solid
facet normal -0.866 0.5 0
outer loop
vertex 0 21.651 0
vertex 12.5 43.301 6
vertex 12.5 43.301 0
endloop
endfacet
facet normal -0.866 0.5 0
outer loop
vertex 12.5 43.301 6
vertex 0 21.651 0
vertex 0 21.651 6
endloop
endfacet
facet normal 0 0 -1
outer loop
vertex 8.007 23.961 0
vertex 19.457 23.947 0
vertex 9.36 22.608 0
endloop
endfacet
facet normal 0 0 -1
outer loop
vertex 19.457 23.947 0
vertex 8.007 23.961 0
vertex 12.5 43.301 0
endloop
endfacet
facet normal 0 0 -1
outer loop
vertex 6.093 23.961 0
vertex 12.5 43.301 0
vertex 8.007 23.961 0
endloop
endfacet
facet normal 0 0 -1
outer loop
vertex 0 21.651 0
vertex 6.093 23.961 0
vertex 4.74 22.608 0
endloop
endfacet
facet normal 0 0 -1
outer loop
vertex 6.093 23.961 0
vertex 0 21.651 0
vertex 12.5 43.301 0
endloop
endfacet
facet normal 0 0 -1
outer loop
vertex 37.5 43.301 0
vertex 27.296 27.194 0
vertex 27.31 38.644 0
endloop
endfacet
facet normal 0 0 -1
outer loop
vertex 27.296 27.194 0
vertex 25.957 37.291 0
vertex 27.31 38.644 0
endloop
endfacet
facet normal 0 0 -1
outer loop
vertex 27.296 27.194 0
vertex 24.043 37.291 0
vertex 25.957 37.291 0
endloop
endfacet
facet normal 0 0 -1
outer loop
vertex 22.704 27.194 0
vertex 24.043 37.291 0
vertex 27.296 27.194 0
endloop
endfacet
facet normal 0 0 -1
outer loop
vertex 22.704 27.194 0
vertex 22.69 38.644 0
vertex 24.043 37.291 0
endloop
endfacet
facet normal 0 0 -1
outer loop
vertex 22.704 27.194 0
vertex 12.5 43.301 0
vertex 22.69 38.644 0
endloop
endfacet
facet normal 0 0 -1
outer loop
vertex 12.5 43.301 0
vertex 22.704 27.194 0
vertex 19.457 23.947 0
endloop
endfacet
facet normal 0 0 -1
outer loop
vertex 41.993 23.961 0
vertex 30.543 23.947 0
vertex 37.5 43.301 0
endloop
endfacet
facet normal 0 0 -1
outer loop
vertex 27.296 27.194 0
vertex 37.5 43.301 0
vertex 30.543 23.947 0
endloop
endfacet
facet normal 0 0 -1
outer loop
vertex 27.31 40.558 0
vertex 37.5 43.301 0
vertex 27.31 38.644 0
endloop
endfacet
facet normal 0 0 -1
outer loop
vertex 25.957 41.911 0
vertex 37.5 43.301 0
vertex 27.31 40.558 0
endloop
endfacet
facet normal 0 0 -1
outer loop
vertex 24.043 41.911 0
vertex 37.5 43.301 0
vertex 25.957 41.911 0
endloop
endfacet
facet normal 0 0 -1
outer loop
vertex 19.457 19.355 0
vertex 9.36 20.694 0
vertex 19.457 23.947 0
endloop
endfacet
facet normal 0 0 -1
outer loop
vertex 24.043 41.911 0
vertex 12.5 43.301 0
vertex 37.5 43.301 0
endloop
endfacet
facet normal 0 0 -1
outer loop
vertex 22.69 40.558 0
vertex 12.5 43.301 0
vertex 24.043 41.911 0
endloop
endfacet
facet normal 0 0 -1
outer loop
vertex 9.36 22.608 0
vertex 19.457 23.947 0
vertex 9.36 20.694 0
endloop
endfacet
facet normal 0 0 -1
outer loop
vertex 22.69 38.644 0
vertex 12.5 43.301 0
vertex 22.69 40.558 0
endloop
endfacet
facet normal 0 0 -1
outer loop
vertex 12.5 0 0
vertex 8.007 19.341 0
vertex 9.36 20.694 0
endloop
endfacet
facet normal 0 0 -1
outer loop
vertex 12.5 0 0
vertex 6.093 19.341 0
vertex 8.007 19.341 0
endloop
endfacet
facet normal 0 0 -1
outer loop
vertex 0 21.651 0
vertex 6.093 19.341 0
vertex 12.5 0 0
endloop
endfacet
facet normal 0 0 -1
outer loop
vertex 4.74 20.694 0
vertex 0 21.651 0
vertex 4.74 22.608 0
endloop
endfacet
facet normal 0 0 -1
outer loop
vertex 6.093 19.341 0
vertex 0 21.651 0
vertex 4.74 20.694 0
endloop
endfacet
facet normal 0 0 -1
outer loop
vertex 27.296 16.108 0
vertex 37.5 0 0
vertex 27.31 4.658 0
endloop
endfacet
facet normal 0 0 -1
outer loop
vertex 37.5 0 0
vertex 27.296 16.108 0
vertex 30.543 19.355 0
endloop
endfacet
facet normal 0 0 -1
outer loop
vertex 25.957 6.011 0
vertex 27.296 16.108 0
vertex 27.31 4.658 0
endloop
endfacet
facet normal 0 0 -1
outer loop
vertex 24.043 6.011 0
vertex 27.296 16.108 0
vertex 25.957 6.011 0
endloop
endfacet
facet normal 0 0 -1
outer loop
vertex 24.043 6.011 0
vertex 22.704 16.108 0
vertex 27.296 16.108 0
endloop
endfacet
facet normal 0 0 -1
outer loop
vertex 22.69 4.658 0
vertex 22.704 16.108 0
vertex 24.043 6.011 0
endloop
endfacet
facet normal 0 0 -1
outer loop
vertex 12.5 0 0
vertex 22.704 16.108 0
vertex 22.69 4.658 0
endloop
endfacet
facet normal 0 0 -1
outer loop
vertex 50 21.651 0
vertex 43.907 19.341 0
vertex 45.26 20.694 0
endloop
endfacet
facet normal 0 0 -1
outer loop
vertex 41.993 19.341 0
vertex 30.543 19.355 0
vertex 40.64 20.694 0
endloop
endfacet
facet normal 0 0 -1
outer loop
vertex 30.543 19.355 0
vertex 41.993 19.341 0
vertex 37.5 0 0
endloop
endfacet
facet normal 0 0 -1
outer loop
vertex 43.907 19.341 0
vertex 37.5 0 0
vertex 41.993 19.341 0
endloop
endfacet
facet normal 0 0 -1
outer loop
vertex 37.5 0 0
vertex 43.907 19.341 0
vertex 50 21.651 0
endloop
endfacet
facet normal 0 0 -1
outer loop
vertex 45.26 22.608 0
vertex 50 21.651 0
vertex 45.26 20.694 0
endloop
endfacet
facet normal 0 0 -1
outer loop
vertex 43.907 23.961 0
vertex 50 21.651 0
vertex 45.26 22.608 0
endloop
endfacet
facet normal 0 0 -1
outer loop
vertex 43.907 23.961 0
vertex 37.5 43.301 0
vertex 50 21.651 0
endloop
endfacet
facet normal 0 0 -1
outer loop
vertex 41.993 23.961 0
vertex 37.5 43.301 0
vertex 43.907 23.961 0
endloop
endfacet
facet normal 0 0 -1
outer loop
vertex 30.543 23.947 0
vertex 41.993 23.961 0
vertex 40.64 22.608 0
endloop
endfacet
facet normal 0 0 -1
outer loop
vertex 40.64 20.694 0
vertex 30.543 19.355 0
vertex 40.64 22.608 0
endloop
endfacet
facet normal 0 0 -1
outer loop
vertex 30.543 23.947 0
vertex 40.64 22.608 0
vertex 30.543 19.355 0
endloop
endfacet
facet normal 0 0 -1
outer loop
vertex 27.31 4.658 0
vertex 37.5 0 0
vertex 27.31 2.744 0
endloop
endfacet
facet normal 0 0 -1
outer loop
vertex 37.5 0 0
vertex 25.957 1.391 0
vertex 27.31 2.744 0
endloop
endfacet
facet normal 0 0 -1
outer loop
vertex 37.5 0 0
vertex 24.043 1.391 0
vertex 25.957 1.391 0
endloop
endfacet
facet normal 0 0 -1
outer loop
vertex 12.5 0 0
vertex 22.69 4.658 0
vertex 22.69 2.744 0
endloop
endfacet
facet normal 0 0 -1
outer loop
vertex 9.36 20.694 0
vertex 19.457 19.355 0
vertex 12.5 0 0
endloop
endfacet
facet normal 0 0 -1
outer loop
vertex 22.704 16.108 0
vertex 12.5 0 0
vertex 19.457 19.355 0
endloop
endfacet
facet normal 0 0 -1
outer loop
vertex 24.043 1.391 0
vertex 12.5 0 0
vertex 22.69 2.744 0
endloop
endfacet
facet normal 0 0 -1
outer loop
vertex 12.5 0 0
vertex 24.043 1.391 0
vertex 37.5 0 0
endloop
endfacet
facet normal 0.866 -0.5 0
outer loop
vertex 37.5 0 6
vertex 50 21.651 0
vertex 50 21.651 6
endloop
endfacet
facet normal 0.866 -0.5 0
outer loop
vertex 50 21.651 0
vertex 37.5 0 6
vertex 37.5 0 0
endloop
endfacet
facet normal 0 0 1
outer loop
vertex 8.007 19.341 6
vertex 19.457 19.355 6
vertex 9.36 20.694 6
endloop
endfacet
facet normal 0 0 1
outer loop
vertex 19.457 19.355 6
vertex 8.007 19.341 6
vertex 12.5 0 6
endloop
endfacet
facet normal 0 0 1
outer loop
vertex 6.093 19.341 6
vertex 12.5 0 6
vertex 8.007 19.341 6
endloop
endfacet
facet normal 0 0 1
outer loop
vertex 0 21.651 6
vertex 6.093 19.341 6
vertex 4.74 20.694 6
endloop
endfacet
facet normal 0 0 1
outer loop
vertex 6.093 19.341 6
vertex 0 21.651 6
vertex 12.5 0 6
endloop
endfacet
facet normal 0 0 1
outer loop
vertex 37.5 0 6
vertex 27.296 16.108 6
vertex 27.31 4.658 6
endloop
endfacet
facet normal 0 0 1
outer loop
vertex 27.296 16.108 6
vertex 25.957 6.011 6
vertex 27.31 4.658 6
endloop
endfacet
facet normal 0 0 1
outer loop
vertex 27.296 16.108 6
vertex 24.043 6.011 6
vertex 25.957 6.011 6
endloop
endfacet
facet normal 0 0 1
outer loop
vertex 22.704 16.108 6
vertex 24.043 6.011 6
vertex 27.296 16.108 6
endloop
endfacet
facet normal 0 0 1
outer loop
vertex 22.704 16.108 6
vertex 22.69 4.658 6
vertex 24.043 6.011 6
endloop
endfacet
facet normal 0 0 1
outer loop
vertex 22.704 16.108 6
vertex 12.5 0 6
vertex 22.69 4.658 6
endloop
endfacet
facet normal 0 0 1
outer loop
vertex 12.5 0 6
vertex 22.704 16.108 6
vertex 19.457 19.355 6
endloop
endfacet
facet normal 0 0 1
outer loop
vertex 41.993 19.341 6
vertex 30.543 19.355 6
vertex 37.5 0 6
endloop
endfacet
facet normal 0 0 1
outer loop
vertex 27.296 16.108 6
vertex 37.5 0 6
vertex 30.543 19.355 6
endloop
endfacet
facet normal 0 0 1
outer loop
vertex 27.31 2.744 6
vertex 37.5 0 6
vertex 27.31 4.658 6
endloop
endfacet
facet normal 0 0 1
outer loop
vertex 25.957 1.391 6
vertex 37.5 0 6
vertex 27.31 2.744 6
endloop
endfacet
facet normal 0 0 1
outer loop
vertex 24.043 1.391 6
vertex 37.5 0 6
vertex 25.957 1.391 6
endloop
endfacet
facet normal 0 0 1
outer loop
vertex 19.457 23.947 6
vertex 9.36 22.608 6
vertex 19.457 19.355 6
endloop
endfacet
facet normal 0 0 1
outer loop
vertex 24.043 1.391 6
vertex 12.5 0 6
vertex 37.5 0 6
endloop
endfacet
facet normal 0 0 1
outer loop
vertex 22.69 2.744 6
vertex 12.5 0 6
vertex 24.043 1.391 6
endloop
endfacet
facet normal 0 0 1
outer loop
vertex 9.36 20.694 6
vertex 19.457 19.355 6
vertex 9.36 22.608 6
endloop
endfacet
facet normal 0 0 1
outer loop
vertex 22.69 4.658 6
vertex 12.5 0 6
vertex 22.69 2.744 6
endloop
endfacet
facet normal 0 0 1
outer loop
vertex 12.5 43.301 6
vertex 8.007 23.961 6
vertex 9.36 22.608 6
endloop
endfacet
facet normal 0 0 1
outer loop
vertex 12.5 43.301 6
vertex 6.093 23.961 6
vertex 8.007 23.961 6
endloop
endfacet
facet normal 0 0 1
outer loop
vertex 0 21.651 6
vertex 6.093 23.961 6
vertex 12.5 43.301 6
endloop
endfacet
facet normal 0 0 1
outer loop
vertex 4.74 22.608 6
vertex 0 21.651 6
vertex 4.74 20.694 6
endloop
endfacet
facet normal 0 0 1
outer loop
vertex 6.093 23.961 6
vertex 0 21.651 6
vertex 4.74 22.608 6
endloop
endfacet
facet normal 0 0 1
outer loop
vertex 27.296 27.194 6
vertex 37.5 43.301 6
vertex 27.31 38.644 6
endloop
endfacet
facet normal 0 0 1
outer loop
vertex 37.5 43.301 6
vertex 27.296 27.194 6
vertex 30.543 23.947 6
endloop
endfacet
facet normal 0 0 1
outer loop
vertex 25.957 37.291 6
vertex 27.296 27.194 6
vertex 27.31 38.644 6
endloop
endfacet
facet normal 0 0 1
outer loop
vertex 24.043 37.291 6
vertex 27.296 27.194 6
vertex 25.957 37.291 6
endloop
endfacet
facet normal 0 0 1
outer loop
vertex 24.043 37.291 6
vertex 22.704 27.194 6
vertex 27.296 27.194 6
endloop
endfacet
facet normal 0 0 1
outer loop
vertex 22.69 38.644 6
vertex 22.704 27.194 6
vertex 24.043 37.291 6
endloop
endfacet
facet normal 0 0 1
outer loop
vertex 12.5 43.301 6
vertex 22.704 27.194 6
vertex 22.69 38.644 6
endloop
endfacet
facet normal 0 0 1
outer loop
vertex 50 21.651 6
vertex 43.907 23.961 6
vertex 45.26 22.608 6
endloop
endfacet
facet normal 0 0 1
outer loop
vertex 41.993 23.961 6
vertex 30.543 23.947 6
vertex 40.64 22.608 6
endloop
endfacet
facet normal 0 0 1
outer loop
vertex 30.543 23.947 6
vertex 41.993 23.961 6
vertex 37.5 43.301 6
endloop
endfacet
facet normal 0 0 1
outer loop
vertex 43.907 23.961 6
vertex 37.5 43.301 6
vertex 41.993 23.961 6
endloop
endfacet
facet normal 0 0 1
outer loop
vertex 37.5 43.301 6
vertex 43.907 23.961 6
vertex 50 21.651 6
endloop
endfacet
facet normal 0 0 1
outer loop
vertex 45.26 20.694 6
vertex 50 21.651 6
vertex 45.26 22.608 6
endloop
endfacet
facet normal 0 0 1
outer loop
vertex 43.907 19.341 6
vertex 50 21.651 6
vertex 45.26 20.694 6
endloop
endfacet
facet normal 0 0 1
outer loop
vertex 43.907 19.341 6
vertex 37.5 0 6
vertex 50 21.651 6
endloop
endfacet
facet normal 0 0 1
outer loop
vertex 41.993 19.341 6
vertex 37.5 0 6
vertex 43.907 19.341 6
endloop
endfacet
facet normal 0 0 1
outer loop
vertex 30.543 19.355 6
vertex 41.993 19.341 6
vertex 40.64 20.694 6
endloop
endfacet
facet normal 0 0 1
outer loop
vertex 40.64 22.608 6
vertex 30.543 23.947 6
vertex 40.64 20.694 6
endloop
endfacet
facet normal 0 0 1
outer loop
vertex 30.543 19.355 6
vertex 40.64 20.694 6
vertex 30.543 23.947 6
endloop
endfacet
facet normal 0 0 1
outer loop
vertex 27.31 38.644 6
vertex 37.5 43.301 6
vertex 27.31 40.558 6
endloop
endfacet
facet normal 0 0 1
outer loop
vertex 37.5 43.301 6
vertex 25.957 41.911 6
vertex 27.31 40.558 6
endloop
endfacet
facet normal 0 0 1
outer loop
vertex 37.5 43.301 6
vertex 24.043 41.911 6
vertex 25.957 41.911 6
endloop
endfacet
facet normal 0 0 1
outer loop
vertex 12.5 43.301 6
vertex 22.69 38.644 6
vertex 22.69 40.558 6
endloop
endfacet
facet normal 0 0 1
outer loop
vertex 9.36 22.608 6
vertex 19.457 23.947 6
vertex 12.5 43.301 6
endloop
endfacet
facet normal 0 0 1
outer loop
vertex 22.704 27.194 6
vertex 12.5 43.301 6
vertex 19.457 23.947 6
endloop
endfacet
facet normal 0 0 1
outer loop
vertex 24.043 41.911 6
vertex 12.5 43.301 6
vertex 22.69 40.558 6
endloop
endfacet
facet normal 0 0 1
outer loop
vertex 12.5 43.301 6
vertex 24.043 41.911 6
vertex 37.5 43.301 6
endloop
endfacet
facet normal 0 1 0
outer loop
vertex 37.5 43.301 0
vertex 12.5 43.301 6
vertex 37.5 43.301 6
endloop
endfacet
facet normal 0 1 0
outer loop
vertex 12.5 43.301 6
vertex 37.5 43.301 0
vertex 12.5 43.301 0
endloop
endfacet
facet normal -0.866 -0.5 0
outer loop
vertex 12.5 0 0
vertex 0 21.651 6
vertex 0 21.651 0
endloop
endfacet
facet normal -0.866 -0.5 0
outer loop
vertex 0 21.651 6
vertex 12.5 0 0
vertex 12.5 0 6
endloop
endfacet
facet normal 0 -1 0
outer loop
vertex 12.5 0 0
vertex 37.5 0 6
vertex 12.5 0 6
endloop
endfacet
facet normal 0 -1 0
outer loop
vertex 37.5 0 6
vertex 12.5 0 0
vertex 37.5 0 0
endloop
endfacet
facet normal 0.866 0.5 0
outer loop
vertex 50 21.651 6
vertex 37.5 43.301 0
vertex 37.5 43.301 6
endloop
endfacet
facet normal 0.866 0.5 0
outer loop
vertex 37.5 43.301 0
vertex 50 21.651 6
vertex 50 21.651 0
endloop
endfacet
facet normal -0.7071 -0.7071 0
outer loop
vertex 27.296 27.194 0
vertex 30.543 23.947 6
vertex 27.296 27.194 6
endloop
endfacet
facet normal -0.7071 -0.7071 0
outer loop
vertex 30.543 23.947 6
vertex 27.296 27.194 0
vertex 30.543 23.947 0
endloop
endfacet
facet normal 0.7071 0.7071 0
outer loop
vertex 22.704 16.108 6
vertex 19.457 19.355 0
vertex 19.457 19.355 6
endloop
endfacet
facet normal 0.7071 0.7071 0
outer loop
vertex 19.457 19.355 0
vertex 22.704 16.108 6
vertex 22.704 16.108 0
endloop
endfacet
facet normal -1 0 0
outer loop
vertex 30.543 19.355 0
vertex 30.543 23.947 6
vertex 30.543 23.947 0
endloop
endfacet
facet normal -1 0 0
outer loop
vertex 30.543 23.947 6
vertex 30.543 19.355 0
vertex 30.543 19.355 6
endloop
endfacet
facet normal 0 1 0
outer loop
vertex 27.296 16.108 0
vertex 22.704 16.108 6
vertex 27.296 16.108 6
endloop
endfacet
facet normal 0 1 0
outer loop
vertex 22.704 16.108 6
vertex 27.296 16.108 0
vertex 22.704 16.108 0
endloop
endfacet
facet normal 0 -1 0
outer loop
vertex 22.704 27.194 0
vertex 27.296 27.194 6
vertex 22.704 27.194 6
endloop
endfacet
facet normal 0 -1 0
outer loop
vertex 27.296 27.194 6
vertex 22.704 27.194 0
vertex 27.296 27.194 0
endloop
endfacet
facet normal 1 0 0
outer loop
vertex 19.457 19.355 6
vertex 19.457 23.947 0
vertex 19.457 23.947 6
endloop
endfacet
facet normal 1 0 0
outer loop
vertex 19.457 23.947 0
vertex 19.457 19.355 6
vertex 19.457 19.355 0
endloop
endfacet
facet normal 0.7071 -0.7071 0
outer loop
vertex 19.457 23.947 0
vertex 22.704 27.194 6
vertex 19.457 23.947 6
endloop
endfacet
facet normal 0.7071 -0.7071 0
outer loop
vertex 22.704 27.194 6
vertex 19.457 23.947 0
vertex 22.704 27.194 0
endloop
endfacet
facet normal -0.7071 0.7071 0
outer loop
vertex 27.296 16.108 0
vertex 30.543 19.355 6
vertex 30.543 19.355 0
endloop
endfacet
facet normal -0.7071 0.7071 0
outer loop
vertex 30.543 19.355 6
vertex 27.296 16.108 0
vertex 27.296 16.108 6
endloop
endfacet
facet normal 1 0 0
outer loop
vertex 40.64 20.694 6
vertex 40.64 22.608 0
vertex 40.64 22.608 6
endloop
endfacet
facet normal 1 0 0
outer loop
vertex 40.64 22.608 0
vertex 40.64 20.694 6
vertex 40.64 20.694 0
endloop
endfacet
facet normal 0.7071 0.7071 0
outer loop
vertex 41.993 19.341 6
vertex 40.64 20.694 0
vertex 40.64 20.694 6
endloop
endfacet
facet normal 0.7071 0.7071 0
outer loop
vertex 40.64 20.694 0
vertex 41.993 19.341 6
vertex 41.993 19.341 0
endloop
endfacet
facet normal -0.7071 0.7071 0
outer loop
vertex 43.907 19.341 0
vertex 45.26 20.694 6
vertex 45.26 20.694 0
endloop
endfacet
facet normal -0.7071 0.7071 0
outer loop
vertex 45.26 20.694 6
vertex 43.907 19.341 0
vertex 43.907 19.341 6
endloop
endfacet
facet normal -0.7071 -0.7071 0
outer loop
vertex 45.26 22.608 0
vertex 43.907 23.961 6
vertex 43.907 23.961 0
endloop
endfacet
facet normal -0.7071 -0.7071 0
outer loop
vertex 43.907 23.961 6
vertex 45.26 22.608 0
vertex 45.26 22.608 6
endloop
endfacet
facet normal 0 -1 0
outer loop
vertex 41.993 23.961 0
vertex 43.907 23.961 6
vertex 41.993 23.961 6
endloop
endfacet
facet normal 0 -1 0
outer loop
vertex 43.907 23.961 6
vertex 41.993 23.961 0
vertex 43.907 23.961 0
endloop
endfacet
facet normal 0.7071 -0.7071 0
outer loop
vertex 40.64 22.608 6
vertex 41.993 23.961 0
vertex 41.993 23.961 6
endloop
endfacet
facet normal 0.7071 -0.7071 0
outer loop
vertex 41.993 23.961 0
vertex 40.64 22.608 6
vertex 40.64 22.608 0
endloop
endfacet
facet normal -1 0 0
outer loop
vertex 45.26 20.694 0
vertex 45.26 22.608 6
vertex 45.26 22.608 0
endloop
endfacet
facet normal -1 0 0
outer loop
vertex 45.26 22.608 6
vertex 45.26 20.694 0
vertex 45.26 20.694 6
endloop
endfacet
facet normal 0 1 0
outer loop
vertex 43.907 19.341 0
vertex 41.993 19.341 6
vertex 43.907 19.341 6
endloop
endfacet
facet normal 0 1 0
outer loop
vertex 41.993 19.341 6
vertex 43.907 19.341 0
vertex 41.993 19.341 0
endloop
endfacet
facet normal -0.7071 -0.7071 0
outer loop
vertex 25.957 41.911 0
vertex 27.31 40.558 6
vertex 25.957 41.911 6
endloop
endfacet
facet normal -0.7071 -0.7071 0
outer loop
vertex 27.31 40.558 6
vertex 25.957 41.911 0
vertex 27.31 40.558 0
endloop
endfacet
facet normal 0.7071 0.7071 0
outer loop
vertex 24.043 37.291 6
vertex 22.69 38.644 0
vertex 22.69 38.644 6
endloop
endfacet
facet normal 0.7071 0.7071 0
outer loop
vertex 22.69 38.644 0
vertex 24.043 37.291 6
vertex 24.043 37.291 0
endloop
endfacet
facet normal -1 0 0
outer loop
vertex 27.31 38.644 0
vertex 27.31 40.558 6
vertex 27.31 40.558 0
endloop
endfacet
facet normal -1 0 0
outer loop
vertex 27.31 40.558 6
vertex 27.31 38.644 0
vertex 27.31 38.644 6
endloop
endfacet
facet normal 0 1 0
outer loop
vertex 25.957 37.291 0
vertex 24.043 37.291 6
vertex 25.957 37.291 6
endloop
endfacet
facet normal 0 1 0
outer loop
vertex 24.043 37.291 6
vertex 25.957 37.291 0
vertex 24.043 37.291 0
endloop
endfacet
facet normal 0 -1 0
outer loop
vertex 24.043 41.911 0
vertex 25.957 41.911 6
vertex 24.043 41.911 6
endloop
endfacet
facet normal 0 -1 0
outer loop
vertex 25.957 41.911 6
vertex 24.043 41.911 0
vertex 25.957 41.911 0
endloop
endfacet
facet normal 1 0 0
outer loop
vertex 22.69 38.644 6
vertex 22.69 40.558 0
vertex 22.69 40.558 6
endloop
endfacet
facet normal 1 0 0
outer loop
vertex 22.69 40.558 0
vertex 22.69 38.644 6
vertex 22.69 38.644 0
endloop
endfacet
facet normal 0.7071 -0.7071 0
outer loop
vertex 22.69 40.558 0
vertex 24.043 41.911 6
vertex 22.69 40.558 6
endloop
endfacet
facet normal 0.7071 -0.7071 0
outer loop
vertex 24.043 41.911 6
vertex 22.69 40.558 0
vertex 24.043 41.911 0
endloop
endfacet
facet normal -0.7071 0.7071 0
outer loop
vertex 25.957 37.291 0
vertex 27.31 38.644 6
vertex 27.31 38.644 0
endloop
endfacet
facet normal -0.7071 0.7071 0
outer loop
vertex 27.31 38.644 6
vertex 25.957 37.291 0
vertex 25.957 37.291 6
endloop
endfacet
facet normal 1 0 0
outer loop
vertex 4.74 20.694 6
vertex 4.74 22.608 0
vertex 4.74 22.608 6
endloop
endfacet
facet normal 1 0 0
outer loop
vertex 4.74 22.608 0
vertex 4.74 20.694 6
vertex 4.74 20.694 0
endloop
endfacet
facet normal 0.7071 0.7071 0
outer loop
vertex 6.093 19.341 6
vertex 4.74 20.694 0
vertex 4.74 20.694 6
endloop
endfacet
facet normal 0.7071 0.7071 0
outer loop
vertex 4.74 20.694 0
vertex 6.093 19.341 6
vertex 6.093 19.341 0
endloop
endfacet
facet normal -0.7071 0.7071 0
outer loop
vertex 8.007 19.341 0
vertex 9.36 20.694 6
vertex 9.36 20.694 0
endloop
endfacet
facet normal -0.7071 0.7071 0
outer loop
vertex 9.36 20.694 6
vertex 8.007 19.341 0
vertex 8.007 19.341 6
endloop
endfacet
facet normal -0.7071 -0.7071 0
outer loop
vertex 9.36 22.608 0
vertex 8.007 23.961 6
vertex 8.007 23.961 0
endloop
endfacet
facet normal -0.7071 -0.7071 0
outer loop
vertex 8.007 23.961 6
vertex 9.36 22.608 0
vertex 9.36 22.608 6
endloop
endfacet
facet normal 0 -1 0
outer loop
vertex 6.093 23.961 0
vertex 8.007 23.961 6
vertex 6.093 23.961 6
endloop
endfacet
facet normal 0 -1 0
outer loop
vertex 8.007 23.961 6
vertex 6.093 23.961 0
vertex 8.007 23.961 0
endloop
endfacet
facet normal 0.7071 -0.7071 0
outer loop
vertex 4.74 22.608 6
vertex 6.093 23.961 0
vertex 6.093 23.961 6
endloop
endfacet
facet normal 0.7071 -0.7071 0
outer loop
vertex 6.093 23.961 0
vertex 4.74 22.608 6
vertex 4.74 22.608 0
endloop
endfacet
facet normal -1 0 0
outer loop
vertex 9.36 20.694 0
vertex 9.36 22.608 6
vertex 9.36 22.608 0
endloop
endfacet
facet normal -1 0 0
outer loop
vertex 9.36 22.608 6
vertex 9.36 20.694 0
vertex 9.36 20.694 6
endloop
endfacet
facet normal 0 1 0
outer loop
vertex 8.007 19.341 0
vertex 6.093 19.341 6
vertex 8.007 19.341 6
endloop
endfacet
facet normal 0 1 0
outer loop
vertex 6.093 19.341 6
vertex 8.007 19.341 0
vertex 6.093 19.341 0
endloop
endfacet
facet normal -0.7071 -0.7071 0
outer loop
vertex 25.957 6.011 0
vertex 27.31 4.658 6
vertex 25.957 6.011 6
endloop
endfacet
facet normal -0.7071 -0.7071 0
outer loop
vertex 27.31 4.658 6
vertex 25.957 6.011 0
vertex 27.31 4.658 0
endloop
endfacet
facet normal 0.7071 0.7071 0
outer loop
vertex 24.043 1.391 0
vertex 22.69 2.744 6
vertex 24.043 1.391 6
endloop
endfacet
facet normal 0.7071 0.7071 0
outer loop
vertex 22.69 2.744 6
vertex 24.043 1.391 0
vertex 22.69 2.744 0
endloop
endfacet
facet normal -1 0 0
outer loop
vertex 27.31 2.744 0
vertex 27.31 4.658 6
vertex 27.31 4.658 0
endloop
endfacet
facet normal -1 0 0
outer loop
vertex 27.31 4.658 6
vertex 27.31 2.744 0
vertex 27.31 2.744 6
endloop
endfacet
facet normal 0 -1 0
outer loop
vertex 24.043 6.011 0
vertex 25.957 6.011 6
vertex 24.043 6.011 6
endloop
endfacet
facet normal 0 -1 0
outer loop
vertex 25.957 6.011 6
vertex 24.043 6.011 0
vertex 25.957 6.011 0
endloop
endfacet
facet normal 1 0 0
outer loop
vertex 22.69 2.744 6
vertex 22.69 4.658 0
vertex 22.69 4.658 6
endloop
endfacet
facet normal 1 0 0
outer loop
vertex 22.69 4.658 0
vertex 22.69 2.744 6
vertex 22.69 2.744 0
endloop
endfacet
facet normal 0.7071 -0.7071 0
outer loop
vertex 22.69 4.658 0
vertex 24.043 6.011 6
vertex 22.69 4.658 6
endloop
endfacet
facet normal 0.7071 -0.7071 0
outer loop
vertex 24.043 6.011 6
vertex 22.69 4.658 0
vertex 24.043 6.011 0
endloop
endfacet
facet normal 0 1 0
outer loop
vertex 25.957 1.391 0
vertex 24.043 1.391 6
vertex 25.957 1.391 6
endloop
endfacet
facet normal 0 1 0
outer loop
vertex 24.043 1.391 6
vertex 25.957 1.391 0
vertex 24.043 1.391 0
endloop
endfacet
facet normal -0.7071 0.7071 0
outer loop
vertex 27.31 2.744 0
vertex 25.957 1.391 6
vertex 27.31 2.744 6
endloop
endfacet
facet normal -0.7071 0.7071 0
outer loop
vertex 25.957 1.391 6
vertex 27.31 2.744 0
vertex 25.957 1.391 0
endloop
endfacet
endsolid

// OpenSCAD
$fn = 32;

// ----------------------------------------------------------------------
// Polygon plate: 6-gon R25, 4 bolt windows
// ----------------------------------------------------------------------

// --- parameters (mm) ---
sides = 6;                // number of polygon sides
plate_r = 25;             // circumscribed radius of the polygon
bore_r = 6;               // centre bore radius
bolts = 4;                // number of bolt windows
ring_r = 17.95;           // bolt-circle radius
bolt_r = 2.5;             // bolt window radius
plate_t = 6;              // plate thickness, Z (extrusion height)

plate_d = 2 * plate_r;  // circumscribed diameter
bore_d = 2 * bore_r;  // centre bore diameter
bolt_d = 2 * bolt_r;  // bolt window diameter
ring_d = 2 * ring_r;  // bolt-circle diameter

profile = [[50, 21.651], [37.5, 43.301], [12.5, 43.301], [0, 21.651], [12.5, 0], [37.5, 0]];  // primary outline, 6 points, counter clockwise
void_1 = [[30.543, 23.947], [27.296, 27.194], [22.704, 27.194], [19.457, 23.947], [19.457, 19.355], [22.704, 16.108], [27.296, 16.108], [30.543, 19.355]];  // centre bore, 8 points
void_2 = [[45.26, 22.608], [43.907, 23.961], [41.993, 23.961], [40.64, 22.608], [40.64, 20.694], [41.993, 19.341], [43.907, 19.341], [45.26, 20.694]];  // bolt window 1, 8 points
void_3 = [[27.31, 40.558], [25.957, 41.911], [24.043, 41.911], [22.69, 40.558], [22.69, 38.644], [24.043, 37.291], [25.957, 37.291], [27.31, 38.644]];  // bolt window 2, 8 points
void_4 = [[9.36, 22.608], [8.007, 23.961], [6.093, 23.961], [4.74, 22.608], [4.74, 20.694], [6.093, 19.341], [8.007, 19.341], [9.36, 20.694]];  // bolt window 3, 8 points
void_5 = [[27.31, 4.658], [25.957, 6.011], [24.043, 6.011], [22.69, 4.658], [22.69, 2.744], [24.043, 1.391], [25.957, 1.391], [27.31, 2.744]];  // bolt window 4, 8 points

// --- the one profile operation ---
difference() {
  linear_extrude(height = plate_t) polygon(points = profile);
  translate([0, 0, -1])
    linear_extrude(height = plate_t + 2) polygon(points = void_1);
  translate([0, 0, -1])
    linear_extrude(height = plate_t + 2) polygon(points = void_2);
  translate([0, 0, -1])
    linear_extrude(height = plate_t + 2) polygon(points = void_3);
  translate([0, 0, -1])
    linear_extrude(height = plate_t + 2) polygon(points = void_4);
  translate([0, 0, -1])
    linear_extrude(height = plate_t + 2) polygon(points = void_5);
}
